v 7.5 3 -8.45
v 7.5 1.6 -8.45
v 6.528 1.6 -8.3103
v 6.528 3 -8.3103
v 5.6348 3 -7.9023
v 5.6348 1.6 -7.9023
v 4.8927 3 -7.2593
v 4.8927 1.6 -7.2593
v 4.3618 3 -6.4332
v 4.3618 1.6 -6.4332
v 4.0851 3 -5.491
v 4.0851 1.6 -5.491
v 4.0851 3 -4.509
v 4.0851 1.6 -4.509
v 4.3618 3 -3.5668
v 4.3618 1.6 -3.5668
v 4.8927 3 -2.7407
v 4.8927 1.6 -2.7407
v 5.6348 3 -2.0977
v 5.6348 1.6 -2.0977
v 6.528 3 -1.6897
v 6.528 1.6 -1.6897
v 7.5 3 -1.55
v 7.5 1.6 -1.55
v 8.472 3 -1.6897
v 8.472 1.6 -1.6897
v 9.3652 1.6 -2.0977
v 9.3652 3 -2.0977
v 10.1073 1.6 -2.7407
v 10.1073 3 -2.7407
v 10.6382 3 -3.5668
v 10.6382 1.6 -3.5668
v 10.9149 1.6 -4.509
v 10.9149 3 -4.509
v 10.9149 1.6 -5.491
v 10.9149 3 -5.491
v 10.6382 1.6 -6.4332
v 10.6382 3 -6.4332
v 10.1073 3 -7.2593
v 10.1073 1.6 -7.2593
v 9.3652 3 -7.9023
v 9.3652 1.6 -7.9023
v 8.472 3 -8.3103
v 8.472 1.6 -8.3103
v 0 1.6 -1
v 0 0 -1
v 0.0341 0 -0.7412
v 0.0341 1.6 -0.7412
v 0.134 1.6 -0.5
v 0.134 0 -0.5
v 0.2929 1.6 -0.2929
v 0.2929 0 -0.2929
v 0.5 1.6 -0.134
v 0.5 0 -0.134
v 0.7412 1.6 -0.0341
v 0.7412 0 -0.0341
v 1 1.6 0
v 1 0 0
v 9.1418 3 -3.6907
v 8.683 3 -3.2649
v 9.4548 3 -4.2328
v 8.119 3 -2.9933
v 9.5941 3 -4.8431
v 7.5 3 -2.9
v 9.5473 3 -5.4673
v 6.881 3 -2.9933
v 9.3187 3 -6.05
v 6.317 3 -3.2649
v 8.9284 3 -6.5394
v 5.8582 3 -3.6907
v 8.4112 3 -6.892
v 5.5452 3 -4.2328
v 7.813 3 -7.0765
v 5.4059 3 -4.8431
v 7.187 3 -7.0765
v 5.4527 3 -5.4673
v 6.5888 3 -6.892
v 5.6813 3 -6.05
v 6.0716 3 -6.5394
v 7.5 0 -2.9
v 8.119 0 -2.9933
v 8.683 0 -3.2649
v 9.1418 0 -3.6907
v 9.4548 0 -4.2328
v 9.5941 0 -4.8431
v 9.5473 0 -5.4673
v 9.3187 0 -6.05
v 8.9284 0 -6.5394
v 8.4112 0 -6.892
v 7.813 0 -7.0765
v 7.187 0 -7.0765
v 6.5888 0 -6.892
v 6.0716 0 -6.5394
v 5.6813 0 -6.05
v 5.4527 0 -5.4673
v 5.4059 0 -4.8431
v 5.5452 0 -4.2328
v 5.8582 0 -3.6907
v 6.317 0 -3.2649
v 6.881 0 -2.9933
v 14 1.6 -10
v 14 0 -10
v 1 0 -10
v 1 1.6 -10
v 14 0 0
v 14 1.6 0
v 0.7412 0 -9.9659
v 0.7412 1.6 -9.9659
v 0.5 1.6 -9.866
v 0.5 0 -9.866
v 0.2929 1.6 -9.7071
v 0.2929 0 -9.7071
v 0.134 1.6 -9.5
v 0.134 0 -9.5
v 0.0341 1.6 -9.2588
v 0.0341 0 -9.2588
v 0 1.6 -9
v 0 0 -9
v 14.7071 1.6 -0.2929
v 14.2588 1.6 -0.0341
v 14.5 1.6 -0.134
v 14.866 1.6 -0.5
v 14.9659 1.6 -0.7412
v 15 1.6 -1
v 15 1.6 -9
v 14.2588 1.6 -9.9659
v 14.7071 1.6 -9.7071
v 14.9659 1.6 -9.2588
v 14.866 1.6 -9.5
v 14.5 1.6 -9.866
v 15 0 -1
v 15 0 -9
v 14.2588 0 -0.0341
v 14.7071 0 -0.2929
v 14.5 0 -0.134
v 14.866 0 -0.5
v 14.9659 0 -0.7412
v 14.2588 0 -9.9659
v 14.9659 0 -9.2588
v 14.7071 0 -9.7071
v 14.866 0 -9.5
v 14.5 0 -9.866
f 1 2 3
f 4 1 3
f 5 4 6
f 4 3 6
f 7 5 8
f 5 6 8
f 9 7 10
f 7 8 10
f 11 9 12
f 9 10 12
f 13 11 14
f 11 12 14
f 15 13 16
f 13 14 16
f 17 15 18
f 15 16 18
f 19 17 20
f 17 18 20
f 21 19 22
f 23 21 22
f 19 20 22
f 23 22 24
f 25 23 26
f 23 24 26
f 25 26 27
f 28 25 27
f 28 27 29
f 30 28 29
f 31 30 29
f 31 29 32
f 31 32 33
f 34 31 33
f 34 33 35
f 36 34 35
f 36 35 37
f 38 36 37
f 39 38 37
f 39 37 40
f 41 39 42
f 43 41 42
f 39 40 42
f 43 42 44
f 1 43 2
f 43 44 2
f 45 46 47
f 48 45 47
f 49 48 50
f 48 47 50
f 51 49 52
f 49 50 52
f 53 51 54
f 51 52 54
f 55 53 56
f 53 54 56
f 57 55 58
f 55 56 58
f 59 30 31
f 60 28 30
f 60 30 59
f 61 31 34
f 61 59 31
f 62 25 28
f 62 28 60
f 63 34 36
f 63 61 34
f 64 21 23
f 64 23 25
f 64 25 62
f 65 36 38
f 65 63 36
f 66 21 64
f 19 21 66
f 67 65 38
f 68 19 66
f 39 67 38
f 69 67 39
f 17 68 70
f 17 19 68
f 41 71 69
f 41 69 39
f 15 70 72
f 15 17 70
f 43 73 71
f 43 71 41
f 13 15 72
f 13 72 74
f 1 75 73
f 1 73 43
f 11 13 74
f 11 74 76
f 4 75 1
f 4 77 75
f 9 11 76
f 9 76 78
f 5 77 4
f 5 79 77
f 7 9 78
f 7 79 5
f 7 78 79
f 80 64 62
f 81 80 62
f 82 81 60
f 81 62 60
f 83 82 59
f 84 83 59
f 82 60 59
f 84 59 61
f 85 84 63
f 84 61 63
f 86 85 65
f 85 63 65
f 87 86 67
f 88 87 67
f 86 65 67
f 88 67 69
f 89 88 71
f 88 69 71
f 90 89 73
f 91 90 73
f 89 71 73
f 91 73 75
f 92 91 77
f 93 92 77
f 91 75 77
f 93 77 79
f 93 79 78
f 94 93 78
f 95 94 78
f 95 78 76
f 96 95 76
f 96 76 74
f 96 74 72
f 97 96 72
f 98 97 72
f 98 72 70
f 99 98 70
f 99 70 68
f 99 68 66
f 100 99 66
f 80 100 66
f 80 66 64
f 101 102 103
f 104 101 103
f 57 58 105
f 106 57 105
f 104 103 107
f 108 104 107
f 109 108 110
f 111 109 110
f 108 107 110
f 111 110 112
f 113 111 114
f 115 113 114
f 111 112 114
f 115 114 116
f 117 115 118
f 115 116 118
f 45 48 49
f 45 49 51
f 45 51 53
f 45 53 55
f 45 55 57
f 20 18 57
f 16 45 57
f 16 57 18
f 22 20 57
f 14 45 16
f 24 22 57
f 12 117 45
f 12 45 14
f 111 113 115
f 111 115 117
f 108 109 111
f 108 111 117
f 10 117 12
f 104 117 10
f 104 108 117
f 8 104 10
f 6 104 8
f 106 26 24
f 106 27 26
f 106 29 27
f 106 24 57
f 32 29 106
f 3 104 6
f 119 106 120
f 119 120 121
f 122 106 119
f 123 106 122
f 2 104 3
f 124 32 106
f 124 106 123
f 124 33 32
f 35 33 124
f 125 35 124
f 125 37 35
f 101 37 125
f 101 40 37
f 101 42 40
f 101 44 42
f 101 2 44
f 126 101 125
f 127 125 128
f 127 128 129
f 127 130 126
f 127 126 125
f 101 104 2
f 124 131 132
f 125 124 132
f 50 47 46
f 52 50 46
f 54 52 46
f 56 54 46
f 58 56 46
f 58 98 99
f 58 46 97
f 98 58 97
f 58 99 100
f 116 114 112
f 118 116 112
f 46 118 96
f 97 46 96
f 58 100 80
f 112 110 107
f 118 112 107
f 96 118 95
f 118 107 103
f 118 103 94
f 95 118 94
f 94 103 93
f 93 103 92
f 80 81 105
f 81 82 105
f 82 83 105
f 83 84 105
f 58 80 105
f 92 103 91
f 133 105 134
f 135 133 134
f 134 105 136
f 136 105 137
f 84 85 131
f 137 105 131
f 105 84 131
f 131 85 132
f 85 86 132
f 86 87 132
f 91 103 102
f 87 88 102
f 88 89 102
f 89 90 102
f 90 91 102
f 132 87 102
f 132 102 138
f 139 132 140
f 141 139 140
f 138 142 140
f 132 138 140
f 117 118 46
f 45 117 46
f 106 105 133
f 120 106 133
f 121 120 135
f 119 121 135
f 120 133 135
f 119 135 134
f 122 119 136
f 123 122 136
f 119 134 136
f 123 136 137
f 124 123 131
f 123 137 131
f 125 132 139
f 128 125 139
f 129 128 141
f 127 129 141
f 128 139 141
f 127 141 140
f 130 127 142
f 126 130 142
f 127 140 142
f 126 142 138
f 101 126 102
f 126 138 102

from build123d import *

# Parameters (mm, degrees)
SALIENTE_EXTRUIR1_DEPTH = 1.6
CROQUIS2_R              = 3.45
SALIENTE_EXTRUIR2_DEPTH = 1.4
CORTAR_EXTRUIR1_REACH   = 20.276
CROQUIS3_R              = 2.1


with BuildPart() as part:
    # Croquis1 → Saliente-Extruir1 (new body)
    with BuildSketch(Plane(origin=(0, 0, 0), x_dir=(1, 0, 0), z_dir=(0, 1, 0))):
        with BuildLine():
            Line((1, 0), (14, 0))
            ThreePointArc((14, 0), (14.707106781, 0.292893219), (15, 1))
            Line((15, 1), (15, 9))
            ThreePointArc((15, 9), (14.707106781, 9.707106781), (14, 10))
            Line((14, 10), (1, 10))
            ThreePointArc((1, 10), (0.292893219, 9.707106781), (0, 9))
            Line((0, 9), (0, 1))
            ThreePointArc((0, 1), (0.292893219, 0.292893219), (1, 0))
        make_face()
    extrude(amount=SALIENTE_EXTRUIR1_DEPTH)

    # Croquis2 → Saliente-Extruir2 (add)
    with BuildSketch(Plane(origin=(0, 1.6, 0), x_dir=(1, 0, 0), z_dir=(0, 1, 0))):
        with Locations(Location((7.5, 5, 0), (0, 0, 90))):
            Circle(CROQUIS2_R)
    extrude(amount=SALIENTE_EXTRUIR2_DEPTH)

    # Croquis3 → Cortar-Extruir1 (cut, up to next)
    with BuildSketch(Plane(origin=(0, 3, 0), x_dir=(1, 0, 0), z_dir=(0, 1, 0)), mode=Mode.PRIVATE) as cortar_extruir1_sk1:
        with Locations(Location((7.5, 5, 0), (0, 0, 270))):
            Circle(CROQUIS3_R)
    cortar_extruir1_tool1 = extrude(cortar_extruir1_sk1.sketch, amount=-CORTAR_EXTRUIR1_REACH, mode=Mode.PRIVATE) & part.part
    add(cortar_extruir1_tool1.solids().sort_by_distance((7.5, 3, -5))[0], mode=Mode.SUBTRACT)


solid = part.part
